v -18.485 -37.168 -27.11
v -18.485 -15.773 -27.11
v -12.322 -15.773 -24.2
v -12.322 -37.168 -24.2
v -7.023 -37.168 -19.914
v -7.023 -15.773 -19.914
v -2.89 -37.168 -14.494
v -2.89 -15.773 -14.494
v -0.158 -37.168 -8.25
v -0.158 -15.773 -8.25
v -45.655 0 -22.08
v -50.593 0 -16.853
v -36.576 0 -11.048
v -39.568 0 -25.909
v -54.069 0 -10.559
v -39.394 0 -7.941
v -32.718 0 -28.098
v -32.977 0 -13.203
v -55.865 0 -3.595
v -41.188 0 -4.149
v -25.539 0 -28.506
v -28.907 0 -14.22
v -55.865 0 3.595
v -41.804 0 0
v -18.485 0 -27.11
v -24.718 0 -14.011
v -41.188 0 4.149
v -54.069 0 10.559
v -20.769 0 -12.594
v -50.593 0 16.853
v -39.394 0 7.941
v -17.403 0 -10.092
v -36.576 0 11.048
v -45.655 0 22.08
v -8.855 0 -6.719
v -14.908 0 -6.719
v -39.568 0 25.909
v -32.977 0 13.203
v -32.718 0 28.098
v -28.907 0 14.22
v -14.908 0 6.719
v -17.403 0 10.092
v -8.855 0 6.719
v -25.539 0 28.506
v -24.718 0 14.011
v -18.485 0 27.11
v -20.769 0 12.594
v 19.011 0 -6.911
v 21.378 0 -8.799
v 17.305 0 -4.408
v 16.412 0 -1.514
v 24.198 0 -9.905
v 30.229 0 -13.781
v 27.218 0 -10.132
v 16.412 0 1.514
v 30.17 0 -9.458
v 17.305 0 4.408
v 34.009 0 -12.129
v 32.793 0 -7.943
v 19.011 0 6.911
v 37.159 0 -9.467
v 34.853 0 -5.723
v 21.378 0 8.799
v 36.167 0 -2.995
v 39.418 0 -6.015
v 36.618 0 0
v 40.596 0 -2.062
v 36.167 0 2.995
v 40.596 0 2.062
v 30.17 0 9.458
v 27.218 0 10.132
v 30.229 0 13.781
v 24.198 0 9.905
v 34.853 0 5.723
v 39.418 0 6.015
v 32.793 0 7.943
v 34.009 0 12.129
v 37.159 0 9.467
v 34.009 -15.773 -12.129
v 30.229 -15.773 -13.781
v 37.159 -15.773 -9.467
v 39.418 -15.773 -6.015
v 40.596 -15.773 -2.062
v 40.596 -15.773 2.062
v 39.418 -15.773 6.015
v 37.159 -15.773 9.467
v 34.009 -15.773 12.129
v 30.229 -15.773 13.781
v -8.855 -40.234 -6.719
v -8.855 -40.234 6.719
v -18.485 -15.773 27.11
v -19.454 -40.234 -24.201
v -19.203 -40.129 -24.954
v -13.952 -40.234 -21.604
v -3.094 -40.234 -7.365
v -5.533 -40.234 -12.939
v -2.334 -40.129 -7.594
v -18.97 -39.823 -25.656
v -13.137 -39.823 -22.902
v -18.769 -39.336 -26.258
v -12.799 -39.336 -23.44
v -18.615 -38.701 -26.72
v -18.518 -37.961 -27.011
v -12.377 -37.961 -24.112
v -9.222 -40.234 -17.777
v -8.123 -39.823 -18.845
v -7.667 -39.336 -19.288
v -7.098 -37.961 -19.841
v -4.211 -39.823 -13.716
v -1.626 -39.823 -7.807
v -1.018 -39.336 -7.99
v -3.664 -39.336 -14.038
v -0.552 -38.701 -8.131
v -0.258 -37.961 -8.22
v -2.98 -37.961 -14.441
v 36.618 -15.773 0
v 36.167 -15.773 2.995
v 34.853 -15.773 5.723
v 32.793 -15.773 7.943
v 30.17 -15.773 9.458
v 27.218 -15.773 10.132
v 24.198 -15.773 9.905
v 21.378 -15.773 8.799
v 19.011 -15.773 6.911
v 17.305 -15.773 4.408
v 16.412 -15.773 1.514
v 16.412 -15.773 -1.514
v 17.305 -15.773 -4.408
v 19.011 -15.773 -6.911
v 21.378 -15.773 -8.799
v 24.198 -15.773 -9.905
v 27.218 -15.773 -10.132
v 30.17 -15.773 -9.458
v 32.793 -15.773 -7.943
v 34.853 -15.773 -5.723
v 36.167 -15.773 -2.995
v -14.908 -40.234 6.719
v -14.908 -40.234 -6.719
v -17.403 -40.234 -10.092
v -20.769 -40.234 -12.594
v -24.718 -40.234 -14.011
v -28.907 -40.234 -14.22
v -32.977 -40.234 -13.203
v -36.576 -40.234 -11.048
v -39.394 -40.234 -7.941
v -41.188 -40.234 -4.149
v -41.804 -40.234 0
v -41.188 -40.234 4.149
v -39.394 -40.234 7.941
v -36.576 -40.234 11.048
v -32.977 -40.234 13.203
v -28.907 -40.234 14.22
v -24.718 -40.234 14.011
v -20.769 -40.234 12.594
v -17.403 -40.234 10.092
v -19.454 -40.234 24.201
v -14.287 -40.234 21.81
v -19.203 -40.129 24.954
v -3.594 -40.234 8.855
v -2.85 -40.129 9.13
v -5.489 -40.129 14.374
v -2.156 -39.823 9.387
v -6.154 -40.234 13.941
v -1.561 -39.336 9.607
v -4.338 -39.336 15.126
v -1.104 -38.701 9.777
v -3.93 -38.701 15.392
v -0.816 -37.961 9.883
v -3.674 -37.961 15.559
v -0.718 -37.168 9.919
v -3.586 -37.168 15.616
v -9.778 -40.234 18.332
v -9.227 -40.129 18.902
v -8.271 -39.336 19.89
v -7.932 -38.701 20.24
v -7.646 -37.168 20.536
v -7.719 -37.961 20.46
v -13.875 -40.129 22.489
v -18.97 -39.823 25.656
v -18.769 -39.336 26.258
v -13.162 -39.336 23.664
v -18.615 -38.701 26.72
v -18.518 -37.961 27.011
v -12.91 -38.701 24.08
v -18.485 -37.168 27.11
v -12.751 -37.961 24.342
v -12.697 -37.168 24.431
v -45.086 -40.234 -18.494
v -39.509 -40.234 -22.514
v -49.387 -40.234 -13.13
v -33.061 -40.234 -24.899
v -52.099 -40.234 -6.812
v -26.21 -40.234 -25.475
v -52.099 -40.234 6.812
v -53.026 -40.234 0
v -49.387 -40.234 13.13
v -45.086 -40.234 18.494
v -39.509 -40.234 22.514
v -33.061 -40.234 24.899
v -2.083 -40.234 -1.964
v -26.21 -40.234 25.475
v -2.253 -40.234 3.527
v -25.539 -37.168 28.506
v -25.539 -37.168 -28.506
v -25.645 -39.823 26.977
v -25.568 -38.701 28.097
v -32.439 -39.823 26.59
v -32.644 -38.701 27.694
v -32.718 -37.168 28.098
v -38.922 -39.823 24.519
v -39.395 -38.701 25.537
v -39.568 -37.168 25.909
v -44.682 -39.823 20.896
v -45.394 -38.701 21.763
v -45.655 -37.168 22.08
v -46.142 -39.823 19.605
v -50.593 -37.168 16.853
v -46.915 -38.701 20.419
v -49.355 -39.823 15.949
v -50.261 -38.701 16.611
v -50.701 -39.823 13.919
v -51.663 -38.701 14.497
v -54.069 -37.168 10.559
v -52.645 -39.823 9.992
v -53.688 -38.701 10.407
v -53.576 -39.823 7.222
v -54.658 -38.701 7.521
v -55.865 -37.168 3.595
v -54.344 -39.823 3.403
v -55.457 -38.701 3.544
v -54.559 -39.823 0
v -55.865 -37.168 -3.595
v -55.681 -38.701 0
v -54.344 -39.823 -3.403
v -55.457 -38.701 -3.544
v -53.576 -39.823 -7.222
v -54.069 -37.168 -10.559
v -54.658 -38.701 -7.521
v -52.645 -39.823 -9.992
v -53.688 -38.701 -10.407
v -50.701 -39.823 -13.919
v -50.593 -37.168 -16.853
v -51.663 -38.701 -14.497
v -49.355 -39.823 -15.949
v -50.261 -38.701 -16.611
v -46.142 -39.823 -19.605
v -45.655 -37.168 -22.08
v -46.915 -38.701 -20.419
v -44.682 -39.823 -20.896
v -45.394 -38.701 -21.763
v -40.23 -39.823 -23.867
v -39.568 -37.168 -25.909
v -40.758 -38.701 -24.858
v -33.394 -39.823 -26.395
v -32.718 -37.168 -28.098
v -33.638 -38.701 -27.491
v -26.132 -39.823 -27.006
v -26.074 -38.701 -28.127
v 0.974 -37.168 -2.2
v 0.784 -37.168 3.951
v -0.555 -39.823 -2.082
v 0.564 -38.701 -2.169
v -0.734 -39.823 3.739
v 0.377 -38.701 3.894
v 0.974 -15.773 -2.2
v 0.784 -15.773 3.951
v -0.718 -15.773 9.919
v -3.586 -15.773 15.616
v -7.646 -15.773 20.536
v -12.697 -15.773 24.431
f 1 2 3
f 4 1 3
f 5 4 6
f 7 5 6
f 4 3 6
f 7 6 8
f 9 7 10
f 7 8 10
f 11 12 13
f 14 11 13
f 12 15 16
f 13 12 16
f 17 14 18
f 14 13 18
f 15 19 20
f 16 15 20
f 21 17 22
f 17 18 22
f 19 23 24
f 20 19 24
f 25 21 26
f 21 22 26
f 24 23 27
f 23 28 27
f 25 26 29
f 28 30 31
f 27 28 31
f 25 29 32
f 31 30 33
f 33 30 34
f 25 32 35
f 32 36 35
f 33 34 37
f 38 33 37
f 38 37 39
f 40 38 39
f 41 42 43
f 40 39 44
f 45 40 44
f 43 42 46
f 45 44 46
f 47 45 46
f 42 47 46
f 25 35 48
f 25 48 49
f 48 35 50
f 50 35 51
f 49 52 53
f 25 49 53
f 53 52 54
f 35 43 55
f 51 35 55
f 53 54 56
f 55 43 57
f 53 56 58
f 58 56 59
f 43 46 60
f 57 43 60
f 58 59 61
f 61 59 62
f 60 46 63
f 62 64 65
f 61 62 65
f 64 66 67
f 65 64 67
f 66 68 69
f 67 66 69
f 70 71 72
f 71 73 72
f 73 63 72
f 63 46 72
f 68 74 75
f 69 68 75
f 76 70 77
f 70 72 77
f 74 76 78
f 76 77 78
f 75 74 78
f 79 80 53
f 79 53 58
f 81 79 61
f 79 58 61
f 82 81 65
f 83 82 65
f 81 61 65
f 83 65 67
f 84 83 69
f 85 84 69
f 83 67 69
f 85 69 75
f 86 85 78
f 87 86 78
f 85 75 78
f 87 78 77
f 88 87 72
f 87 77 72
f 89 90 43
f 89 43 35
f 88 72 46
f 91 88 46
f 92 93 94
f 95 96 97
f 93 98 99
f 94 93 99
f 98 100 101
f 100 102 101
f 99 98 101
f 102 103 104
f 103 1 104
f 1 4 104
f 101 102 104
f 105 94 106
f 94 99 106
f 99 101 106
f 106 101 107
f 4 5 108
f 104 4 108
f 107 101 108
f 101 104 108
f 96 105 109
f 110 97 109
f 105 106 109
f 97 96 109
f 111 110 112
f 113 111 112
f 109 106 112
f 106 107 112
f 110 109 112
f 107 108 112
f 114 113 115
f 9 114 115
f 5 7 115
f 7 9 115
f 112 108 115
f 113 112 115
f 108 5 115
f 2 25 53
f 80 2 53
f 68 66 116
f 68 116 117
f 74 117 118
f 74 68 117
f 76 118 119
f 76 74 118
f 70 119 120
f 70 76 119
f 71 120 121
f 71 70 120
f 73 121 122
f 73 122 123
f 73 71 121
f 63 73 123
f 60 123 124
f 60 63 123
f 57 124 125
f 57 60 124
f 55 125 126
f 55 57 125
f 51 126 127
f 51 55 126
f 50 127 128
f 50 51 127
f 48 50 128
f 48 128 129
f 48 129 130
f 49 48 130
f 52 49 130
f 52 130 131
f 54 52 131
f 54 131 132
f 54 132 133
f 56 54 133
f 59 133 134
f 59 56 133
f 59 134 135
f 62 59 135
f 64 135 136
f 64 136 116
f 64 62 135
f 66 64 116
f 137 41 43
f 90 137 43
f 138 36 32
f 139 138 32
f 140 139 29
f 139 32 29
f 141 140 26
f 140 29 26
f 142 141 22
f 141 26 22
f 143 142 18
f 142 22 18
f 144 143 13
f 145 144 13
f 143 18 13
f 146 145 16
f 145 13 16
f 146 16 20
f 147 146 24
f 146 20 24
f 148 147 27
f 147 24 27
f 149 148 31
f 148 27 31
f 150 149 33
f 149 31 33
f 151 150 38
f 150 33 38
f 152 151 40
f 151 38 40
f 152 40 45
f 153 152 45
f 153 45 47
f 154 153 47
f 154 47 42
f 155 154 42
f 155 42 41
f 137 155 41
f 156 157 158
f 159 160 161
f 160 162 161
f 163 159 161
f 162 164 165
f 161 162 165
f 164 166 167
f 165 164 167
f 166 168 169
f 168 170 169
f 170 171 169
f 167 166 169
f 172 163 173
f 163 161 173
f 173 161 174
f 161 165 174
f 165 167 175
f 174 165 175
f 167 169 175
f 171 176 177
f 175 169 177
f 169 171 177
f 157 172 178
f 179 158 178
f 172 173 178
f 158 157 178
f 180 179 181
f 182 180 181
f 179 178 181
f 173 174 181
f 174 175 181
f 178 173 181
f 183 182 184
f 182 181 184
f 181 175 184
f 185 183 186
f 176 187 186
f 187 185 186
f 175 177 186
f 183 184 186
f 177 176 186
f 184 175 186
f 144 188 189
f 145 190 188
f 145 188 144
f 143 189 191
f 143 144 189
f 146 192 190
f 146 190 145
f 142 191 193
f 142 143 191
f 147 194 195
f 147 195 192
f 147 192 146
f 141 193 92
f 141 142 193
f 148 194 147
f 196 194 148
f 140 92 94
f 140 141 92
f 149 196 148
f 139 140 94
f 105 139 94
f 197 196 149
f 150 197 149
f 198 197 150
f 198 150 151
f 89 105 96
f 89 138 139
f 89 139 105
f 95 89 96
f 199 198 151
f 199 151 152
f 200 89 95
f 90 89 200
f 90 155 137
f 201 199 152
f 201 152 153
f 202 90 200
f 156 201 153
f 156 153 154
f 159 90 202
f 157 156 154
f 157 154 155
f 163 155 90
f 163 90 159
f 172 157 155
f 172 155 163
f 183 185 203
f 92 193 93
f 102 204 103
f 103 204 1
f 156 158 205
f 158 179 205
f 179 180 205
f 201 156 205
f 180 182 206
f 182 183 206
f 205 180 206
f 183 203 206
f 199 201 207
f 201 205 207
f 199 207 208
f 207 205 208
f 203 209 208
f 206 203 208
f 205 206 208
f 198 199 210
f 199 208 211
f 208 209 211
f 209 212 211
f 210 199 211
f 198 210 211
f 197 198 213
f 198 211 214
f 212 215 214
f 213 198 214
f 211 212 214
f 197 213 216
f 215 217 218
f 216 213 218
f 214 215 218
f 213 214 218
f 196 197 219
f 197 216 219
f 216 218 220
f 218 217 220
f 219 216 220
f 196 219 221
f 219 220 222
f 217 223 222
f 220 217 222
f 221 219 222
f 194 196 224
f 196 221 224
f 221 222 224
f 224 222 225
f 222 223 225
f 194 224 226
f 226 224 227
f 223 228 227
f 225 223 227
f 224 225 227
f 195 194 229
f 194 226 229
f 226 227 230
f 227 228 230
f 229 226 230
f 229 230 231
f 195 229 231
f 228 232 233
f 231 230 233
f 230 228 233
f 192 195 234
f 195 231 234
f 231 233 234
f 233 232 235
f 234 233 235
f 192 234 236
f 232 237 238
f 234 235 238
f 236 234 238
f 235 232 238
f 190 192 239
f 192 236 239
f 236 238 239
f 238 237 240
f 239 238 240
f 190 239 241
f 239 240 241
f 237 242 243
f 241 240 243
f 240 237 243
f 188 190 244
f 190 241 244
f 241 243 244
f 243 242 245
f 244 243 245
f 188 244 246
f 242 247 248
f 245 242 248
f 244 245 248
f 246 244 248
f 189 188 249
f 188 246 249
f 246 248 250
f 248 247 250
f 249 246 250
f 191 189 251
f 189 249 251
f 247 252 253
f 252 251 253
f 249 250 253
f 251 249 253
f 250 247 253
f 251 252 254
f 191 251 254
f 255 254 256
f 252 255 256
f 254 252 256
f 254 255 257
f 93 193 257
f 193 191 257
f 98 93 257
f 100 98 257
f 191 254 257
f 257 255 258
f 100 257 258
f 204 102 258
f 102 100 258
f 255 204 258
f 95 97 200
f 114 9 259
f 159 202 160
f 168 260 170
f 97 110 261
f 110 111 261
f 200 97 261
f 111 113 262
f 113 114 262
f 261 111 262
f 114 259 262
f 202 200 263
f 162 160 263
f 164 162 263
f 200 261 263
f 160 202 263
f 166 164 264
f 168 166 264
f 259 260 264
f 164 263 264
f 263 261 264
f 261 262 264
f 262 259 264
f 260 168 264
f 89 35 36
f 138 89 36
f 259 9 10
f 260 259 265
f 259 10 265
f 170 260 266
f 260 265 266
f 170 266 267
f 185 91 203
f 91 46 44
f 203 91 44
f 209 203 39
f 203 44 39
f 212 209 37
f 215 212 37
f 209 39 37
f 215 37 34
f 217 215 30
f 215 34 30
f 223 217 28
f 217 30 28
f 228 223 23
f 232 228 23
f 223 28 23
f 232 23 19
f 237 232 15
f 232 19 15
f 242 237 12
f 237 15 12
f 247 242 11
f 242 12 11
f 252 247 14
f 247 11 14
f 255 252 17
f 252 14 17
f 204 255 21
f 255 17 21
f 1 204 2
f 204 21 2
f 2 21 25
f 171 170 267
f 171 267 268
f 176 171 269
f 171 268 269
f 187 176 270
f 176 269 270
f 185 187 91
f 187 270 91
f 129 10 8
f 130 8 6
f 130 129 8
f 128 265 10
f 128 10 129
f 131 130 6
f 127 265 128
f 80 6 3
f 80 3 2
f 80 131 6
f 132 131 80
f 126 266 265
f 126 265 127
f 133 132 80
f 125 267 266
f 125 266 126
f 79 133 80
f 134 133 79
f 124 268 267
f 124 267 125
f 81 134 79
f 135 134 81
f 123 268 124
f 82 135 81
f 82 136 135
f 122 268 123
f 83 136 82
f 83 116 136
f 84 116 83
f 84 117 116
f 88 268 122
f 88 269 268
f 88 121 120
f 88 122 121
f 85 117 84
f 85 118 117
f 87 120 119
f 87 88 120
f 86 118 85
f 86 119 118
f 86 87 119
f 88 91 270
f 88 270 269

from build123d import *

# Parameters (mm, degrees)
F0_R     = 10.16
F1_DEPTH = 15.7734
F2_DEPTH = 40.2336
F3_R     = 3.066051


with BuildPart() as f1:
    # F0 (on Front) → F1 (new body)
    with BuildSketch(Plane.XZ):
        with BuildLine():
            ThreePointArc((-18.485138, 27.110208), (-7.646431, 20.535508), (-0.718441, 9.919144))
            ThreePointArc((-0.718441, 9.919144), (1.044836, 0.88042), (-0.158376, -8.249748))
            ThreePointArc((-0.158376, -8.249748), (-7.023149, -19.913542), (-18.485138, -27.110208))
            Line((-18.485138, -27.110208), (30.22916, -13.78093))
            ThreePointArc((30.22916, -13.78093), (40.745902, 0), (30.22916, 13.78093))
            Line((30.22916, 13.78093), (-18.485138, 27.110208))
        make_face()
        with Locations((26.458402, 0)):
            Circle(F0_R, mode=Mode.SUBTRACT)
    extrude(amount=F1_DEPTH)

    # F0 (on Front) → F2 (join)
    with BuildSketch(Plane.XZ):
        with BuildLine():
            ThreePointArc((-0.158376, -8.249748), (1.044836, 0.88042), (-0.718441, 9.919144))
            ThreePointArc((-0.718441, 9.919144), (-7.646431, 20.535508), (-18.485138, 27.110208))
            ThreePointArc((-18.485138, 27.110208), (-56.091598, 0), (-18.485138, -27.110208))
            ThreePointArc((-18.485138, -27.110208), (-7.023149, -19.913542), (-0.158376, -8.249748))
        make_face()
        with BuildLine():
            ThreePointArc((-14.907705, -6.719262), (-41.804098, 0), (-14.907705, 6.719262))
            Line((-14.907705, 6.719262), (-8.855358, 6.719262))
            Line((-8.855358, 6.719262), (-8.855358, -6.719262))
            Line((-8.855358, -6.719262), (-14.907705, -6.719262))
        make_face(mode=Mode.SUBTRACT)
    extrude(amount=F2_DEPTH)

    # F3
    f3_edges = [f1.edges().sort_by_distance(p)[0] for p in [
        (-36.548058, -40.2336, 27.110208),
    ]]
    fillet(f3_edges, radius=F3_R)


solid = f1.part
